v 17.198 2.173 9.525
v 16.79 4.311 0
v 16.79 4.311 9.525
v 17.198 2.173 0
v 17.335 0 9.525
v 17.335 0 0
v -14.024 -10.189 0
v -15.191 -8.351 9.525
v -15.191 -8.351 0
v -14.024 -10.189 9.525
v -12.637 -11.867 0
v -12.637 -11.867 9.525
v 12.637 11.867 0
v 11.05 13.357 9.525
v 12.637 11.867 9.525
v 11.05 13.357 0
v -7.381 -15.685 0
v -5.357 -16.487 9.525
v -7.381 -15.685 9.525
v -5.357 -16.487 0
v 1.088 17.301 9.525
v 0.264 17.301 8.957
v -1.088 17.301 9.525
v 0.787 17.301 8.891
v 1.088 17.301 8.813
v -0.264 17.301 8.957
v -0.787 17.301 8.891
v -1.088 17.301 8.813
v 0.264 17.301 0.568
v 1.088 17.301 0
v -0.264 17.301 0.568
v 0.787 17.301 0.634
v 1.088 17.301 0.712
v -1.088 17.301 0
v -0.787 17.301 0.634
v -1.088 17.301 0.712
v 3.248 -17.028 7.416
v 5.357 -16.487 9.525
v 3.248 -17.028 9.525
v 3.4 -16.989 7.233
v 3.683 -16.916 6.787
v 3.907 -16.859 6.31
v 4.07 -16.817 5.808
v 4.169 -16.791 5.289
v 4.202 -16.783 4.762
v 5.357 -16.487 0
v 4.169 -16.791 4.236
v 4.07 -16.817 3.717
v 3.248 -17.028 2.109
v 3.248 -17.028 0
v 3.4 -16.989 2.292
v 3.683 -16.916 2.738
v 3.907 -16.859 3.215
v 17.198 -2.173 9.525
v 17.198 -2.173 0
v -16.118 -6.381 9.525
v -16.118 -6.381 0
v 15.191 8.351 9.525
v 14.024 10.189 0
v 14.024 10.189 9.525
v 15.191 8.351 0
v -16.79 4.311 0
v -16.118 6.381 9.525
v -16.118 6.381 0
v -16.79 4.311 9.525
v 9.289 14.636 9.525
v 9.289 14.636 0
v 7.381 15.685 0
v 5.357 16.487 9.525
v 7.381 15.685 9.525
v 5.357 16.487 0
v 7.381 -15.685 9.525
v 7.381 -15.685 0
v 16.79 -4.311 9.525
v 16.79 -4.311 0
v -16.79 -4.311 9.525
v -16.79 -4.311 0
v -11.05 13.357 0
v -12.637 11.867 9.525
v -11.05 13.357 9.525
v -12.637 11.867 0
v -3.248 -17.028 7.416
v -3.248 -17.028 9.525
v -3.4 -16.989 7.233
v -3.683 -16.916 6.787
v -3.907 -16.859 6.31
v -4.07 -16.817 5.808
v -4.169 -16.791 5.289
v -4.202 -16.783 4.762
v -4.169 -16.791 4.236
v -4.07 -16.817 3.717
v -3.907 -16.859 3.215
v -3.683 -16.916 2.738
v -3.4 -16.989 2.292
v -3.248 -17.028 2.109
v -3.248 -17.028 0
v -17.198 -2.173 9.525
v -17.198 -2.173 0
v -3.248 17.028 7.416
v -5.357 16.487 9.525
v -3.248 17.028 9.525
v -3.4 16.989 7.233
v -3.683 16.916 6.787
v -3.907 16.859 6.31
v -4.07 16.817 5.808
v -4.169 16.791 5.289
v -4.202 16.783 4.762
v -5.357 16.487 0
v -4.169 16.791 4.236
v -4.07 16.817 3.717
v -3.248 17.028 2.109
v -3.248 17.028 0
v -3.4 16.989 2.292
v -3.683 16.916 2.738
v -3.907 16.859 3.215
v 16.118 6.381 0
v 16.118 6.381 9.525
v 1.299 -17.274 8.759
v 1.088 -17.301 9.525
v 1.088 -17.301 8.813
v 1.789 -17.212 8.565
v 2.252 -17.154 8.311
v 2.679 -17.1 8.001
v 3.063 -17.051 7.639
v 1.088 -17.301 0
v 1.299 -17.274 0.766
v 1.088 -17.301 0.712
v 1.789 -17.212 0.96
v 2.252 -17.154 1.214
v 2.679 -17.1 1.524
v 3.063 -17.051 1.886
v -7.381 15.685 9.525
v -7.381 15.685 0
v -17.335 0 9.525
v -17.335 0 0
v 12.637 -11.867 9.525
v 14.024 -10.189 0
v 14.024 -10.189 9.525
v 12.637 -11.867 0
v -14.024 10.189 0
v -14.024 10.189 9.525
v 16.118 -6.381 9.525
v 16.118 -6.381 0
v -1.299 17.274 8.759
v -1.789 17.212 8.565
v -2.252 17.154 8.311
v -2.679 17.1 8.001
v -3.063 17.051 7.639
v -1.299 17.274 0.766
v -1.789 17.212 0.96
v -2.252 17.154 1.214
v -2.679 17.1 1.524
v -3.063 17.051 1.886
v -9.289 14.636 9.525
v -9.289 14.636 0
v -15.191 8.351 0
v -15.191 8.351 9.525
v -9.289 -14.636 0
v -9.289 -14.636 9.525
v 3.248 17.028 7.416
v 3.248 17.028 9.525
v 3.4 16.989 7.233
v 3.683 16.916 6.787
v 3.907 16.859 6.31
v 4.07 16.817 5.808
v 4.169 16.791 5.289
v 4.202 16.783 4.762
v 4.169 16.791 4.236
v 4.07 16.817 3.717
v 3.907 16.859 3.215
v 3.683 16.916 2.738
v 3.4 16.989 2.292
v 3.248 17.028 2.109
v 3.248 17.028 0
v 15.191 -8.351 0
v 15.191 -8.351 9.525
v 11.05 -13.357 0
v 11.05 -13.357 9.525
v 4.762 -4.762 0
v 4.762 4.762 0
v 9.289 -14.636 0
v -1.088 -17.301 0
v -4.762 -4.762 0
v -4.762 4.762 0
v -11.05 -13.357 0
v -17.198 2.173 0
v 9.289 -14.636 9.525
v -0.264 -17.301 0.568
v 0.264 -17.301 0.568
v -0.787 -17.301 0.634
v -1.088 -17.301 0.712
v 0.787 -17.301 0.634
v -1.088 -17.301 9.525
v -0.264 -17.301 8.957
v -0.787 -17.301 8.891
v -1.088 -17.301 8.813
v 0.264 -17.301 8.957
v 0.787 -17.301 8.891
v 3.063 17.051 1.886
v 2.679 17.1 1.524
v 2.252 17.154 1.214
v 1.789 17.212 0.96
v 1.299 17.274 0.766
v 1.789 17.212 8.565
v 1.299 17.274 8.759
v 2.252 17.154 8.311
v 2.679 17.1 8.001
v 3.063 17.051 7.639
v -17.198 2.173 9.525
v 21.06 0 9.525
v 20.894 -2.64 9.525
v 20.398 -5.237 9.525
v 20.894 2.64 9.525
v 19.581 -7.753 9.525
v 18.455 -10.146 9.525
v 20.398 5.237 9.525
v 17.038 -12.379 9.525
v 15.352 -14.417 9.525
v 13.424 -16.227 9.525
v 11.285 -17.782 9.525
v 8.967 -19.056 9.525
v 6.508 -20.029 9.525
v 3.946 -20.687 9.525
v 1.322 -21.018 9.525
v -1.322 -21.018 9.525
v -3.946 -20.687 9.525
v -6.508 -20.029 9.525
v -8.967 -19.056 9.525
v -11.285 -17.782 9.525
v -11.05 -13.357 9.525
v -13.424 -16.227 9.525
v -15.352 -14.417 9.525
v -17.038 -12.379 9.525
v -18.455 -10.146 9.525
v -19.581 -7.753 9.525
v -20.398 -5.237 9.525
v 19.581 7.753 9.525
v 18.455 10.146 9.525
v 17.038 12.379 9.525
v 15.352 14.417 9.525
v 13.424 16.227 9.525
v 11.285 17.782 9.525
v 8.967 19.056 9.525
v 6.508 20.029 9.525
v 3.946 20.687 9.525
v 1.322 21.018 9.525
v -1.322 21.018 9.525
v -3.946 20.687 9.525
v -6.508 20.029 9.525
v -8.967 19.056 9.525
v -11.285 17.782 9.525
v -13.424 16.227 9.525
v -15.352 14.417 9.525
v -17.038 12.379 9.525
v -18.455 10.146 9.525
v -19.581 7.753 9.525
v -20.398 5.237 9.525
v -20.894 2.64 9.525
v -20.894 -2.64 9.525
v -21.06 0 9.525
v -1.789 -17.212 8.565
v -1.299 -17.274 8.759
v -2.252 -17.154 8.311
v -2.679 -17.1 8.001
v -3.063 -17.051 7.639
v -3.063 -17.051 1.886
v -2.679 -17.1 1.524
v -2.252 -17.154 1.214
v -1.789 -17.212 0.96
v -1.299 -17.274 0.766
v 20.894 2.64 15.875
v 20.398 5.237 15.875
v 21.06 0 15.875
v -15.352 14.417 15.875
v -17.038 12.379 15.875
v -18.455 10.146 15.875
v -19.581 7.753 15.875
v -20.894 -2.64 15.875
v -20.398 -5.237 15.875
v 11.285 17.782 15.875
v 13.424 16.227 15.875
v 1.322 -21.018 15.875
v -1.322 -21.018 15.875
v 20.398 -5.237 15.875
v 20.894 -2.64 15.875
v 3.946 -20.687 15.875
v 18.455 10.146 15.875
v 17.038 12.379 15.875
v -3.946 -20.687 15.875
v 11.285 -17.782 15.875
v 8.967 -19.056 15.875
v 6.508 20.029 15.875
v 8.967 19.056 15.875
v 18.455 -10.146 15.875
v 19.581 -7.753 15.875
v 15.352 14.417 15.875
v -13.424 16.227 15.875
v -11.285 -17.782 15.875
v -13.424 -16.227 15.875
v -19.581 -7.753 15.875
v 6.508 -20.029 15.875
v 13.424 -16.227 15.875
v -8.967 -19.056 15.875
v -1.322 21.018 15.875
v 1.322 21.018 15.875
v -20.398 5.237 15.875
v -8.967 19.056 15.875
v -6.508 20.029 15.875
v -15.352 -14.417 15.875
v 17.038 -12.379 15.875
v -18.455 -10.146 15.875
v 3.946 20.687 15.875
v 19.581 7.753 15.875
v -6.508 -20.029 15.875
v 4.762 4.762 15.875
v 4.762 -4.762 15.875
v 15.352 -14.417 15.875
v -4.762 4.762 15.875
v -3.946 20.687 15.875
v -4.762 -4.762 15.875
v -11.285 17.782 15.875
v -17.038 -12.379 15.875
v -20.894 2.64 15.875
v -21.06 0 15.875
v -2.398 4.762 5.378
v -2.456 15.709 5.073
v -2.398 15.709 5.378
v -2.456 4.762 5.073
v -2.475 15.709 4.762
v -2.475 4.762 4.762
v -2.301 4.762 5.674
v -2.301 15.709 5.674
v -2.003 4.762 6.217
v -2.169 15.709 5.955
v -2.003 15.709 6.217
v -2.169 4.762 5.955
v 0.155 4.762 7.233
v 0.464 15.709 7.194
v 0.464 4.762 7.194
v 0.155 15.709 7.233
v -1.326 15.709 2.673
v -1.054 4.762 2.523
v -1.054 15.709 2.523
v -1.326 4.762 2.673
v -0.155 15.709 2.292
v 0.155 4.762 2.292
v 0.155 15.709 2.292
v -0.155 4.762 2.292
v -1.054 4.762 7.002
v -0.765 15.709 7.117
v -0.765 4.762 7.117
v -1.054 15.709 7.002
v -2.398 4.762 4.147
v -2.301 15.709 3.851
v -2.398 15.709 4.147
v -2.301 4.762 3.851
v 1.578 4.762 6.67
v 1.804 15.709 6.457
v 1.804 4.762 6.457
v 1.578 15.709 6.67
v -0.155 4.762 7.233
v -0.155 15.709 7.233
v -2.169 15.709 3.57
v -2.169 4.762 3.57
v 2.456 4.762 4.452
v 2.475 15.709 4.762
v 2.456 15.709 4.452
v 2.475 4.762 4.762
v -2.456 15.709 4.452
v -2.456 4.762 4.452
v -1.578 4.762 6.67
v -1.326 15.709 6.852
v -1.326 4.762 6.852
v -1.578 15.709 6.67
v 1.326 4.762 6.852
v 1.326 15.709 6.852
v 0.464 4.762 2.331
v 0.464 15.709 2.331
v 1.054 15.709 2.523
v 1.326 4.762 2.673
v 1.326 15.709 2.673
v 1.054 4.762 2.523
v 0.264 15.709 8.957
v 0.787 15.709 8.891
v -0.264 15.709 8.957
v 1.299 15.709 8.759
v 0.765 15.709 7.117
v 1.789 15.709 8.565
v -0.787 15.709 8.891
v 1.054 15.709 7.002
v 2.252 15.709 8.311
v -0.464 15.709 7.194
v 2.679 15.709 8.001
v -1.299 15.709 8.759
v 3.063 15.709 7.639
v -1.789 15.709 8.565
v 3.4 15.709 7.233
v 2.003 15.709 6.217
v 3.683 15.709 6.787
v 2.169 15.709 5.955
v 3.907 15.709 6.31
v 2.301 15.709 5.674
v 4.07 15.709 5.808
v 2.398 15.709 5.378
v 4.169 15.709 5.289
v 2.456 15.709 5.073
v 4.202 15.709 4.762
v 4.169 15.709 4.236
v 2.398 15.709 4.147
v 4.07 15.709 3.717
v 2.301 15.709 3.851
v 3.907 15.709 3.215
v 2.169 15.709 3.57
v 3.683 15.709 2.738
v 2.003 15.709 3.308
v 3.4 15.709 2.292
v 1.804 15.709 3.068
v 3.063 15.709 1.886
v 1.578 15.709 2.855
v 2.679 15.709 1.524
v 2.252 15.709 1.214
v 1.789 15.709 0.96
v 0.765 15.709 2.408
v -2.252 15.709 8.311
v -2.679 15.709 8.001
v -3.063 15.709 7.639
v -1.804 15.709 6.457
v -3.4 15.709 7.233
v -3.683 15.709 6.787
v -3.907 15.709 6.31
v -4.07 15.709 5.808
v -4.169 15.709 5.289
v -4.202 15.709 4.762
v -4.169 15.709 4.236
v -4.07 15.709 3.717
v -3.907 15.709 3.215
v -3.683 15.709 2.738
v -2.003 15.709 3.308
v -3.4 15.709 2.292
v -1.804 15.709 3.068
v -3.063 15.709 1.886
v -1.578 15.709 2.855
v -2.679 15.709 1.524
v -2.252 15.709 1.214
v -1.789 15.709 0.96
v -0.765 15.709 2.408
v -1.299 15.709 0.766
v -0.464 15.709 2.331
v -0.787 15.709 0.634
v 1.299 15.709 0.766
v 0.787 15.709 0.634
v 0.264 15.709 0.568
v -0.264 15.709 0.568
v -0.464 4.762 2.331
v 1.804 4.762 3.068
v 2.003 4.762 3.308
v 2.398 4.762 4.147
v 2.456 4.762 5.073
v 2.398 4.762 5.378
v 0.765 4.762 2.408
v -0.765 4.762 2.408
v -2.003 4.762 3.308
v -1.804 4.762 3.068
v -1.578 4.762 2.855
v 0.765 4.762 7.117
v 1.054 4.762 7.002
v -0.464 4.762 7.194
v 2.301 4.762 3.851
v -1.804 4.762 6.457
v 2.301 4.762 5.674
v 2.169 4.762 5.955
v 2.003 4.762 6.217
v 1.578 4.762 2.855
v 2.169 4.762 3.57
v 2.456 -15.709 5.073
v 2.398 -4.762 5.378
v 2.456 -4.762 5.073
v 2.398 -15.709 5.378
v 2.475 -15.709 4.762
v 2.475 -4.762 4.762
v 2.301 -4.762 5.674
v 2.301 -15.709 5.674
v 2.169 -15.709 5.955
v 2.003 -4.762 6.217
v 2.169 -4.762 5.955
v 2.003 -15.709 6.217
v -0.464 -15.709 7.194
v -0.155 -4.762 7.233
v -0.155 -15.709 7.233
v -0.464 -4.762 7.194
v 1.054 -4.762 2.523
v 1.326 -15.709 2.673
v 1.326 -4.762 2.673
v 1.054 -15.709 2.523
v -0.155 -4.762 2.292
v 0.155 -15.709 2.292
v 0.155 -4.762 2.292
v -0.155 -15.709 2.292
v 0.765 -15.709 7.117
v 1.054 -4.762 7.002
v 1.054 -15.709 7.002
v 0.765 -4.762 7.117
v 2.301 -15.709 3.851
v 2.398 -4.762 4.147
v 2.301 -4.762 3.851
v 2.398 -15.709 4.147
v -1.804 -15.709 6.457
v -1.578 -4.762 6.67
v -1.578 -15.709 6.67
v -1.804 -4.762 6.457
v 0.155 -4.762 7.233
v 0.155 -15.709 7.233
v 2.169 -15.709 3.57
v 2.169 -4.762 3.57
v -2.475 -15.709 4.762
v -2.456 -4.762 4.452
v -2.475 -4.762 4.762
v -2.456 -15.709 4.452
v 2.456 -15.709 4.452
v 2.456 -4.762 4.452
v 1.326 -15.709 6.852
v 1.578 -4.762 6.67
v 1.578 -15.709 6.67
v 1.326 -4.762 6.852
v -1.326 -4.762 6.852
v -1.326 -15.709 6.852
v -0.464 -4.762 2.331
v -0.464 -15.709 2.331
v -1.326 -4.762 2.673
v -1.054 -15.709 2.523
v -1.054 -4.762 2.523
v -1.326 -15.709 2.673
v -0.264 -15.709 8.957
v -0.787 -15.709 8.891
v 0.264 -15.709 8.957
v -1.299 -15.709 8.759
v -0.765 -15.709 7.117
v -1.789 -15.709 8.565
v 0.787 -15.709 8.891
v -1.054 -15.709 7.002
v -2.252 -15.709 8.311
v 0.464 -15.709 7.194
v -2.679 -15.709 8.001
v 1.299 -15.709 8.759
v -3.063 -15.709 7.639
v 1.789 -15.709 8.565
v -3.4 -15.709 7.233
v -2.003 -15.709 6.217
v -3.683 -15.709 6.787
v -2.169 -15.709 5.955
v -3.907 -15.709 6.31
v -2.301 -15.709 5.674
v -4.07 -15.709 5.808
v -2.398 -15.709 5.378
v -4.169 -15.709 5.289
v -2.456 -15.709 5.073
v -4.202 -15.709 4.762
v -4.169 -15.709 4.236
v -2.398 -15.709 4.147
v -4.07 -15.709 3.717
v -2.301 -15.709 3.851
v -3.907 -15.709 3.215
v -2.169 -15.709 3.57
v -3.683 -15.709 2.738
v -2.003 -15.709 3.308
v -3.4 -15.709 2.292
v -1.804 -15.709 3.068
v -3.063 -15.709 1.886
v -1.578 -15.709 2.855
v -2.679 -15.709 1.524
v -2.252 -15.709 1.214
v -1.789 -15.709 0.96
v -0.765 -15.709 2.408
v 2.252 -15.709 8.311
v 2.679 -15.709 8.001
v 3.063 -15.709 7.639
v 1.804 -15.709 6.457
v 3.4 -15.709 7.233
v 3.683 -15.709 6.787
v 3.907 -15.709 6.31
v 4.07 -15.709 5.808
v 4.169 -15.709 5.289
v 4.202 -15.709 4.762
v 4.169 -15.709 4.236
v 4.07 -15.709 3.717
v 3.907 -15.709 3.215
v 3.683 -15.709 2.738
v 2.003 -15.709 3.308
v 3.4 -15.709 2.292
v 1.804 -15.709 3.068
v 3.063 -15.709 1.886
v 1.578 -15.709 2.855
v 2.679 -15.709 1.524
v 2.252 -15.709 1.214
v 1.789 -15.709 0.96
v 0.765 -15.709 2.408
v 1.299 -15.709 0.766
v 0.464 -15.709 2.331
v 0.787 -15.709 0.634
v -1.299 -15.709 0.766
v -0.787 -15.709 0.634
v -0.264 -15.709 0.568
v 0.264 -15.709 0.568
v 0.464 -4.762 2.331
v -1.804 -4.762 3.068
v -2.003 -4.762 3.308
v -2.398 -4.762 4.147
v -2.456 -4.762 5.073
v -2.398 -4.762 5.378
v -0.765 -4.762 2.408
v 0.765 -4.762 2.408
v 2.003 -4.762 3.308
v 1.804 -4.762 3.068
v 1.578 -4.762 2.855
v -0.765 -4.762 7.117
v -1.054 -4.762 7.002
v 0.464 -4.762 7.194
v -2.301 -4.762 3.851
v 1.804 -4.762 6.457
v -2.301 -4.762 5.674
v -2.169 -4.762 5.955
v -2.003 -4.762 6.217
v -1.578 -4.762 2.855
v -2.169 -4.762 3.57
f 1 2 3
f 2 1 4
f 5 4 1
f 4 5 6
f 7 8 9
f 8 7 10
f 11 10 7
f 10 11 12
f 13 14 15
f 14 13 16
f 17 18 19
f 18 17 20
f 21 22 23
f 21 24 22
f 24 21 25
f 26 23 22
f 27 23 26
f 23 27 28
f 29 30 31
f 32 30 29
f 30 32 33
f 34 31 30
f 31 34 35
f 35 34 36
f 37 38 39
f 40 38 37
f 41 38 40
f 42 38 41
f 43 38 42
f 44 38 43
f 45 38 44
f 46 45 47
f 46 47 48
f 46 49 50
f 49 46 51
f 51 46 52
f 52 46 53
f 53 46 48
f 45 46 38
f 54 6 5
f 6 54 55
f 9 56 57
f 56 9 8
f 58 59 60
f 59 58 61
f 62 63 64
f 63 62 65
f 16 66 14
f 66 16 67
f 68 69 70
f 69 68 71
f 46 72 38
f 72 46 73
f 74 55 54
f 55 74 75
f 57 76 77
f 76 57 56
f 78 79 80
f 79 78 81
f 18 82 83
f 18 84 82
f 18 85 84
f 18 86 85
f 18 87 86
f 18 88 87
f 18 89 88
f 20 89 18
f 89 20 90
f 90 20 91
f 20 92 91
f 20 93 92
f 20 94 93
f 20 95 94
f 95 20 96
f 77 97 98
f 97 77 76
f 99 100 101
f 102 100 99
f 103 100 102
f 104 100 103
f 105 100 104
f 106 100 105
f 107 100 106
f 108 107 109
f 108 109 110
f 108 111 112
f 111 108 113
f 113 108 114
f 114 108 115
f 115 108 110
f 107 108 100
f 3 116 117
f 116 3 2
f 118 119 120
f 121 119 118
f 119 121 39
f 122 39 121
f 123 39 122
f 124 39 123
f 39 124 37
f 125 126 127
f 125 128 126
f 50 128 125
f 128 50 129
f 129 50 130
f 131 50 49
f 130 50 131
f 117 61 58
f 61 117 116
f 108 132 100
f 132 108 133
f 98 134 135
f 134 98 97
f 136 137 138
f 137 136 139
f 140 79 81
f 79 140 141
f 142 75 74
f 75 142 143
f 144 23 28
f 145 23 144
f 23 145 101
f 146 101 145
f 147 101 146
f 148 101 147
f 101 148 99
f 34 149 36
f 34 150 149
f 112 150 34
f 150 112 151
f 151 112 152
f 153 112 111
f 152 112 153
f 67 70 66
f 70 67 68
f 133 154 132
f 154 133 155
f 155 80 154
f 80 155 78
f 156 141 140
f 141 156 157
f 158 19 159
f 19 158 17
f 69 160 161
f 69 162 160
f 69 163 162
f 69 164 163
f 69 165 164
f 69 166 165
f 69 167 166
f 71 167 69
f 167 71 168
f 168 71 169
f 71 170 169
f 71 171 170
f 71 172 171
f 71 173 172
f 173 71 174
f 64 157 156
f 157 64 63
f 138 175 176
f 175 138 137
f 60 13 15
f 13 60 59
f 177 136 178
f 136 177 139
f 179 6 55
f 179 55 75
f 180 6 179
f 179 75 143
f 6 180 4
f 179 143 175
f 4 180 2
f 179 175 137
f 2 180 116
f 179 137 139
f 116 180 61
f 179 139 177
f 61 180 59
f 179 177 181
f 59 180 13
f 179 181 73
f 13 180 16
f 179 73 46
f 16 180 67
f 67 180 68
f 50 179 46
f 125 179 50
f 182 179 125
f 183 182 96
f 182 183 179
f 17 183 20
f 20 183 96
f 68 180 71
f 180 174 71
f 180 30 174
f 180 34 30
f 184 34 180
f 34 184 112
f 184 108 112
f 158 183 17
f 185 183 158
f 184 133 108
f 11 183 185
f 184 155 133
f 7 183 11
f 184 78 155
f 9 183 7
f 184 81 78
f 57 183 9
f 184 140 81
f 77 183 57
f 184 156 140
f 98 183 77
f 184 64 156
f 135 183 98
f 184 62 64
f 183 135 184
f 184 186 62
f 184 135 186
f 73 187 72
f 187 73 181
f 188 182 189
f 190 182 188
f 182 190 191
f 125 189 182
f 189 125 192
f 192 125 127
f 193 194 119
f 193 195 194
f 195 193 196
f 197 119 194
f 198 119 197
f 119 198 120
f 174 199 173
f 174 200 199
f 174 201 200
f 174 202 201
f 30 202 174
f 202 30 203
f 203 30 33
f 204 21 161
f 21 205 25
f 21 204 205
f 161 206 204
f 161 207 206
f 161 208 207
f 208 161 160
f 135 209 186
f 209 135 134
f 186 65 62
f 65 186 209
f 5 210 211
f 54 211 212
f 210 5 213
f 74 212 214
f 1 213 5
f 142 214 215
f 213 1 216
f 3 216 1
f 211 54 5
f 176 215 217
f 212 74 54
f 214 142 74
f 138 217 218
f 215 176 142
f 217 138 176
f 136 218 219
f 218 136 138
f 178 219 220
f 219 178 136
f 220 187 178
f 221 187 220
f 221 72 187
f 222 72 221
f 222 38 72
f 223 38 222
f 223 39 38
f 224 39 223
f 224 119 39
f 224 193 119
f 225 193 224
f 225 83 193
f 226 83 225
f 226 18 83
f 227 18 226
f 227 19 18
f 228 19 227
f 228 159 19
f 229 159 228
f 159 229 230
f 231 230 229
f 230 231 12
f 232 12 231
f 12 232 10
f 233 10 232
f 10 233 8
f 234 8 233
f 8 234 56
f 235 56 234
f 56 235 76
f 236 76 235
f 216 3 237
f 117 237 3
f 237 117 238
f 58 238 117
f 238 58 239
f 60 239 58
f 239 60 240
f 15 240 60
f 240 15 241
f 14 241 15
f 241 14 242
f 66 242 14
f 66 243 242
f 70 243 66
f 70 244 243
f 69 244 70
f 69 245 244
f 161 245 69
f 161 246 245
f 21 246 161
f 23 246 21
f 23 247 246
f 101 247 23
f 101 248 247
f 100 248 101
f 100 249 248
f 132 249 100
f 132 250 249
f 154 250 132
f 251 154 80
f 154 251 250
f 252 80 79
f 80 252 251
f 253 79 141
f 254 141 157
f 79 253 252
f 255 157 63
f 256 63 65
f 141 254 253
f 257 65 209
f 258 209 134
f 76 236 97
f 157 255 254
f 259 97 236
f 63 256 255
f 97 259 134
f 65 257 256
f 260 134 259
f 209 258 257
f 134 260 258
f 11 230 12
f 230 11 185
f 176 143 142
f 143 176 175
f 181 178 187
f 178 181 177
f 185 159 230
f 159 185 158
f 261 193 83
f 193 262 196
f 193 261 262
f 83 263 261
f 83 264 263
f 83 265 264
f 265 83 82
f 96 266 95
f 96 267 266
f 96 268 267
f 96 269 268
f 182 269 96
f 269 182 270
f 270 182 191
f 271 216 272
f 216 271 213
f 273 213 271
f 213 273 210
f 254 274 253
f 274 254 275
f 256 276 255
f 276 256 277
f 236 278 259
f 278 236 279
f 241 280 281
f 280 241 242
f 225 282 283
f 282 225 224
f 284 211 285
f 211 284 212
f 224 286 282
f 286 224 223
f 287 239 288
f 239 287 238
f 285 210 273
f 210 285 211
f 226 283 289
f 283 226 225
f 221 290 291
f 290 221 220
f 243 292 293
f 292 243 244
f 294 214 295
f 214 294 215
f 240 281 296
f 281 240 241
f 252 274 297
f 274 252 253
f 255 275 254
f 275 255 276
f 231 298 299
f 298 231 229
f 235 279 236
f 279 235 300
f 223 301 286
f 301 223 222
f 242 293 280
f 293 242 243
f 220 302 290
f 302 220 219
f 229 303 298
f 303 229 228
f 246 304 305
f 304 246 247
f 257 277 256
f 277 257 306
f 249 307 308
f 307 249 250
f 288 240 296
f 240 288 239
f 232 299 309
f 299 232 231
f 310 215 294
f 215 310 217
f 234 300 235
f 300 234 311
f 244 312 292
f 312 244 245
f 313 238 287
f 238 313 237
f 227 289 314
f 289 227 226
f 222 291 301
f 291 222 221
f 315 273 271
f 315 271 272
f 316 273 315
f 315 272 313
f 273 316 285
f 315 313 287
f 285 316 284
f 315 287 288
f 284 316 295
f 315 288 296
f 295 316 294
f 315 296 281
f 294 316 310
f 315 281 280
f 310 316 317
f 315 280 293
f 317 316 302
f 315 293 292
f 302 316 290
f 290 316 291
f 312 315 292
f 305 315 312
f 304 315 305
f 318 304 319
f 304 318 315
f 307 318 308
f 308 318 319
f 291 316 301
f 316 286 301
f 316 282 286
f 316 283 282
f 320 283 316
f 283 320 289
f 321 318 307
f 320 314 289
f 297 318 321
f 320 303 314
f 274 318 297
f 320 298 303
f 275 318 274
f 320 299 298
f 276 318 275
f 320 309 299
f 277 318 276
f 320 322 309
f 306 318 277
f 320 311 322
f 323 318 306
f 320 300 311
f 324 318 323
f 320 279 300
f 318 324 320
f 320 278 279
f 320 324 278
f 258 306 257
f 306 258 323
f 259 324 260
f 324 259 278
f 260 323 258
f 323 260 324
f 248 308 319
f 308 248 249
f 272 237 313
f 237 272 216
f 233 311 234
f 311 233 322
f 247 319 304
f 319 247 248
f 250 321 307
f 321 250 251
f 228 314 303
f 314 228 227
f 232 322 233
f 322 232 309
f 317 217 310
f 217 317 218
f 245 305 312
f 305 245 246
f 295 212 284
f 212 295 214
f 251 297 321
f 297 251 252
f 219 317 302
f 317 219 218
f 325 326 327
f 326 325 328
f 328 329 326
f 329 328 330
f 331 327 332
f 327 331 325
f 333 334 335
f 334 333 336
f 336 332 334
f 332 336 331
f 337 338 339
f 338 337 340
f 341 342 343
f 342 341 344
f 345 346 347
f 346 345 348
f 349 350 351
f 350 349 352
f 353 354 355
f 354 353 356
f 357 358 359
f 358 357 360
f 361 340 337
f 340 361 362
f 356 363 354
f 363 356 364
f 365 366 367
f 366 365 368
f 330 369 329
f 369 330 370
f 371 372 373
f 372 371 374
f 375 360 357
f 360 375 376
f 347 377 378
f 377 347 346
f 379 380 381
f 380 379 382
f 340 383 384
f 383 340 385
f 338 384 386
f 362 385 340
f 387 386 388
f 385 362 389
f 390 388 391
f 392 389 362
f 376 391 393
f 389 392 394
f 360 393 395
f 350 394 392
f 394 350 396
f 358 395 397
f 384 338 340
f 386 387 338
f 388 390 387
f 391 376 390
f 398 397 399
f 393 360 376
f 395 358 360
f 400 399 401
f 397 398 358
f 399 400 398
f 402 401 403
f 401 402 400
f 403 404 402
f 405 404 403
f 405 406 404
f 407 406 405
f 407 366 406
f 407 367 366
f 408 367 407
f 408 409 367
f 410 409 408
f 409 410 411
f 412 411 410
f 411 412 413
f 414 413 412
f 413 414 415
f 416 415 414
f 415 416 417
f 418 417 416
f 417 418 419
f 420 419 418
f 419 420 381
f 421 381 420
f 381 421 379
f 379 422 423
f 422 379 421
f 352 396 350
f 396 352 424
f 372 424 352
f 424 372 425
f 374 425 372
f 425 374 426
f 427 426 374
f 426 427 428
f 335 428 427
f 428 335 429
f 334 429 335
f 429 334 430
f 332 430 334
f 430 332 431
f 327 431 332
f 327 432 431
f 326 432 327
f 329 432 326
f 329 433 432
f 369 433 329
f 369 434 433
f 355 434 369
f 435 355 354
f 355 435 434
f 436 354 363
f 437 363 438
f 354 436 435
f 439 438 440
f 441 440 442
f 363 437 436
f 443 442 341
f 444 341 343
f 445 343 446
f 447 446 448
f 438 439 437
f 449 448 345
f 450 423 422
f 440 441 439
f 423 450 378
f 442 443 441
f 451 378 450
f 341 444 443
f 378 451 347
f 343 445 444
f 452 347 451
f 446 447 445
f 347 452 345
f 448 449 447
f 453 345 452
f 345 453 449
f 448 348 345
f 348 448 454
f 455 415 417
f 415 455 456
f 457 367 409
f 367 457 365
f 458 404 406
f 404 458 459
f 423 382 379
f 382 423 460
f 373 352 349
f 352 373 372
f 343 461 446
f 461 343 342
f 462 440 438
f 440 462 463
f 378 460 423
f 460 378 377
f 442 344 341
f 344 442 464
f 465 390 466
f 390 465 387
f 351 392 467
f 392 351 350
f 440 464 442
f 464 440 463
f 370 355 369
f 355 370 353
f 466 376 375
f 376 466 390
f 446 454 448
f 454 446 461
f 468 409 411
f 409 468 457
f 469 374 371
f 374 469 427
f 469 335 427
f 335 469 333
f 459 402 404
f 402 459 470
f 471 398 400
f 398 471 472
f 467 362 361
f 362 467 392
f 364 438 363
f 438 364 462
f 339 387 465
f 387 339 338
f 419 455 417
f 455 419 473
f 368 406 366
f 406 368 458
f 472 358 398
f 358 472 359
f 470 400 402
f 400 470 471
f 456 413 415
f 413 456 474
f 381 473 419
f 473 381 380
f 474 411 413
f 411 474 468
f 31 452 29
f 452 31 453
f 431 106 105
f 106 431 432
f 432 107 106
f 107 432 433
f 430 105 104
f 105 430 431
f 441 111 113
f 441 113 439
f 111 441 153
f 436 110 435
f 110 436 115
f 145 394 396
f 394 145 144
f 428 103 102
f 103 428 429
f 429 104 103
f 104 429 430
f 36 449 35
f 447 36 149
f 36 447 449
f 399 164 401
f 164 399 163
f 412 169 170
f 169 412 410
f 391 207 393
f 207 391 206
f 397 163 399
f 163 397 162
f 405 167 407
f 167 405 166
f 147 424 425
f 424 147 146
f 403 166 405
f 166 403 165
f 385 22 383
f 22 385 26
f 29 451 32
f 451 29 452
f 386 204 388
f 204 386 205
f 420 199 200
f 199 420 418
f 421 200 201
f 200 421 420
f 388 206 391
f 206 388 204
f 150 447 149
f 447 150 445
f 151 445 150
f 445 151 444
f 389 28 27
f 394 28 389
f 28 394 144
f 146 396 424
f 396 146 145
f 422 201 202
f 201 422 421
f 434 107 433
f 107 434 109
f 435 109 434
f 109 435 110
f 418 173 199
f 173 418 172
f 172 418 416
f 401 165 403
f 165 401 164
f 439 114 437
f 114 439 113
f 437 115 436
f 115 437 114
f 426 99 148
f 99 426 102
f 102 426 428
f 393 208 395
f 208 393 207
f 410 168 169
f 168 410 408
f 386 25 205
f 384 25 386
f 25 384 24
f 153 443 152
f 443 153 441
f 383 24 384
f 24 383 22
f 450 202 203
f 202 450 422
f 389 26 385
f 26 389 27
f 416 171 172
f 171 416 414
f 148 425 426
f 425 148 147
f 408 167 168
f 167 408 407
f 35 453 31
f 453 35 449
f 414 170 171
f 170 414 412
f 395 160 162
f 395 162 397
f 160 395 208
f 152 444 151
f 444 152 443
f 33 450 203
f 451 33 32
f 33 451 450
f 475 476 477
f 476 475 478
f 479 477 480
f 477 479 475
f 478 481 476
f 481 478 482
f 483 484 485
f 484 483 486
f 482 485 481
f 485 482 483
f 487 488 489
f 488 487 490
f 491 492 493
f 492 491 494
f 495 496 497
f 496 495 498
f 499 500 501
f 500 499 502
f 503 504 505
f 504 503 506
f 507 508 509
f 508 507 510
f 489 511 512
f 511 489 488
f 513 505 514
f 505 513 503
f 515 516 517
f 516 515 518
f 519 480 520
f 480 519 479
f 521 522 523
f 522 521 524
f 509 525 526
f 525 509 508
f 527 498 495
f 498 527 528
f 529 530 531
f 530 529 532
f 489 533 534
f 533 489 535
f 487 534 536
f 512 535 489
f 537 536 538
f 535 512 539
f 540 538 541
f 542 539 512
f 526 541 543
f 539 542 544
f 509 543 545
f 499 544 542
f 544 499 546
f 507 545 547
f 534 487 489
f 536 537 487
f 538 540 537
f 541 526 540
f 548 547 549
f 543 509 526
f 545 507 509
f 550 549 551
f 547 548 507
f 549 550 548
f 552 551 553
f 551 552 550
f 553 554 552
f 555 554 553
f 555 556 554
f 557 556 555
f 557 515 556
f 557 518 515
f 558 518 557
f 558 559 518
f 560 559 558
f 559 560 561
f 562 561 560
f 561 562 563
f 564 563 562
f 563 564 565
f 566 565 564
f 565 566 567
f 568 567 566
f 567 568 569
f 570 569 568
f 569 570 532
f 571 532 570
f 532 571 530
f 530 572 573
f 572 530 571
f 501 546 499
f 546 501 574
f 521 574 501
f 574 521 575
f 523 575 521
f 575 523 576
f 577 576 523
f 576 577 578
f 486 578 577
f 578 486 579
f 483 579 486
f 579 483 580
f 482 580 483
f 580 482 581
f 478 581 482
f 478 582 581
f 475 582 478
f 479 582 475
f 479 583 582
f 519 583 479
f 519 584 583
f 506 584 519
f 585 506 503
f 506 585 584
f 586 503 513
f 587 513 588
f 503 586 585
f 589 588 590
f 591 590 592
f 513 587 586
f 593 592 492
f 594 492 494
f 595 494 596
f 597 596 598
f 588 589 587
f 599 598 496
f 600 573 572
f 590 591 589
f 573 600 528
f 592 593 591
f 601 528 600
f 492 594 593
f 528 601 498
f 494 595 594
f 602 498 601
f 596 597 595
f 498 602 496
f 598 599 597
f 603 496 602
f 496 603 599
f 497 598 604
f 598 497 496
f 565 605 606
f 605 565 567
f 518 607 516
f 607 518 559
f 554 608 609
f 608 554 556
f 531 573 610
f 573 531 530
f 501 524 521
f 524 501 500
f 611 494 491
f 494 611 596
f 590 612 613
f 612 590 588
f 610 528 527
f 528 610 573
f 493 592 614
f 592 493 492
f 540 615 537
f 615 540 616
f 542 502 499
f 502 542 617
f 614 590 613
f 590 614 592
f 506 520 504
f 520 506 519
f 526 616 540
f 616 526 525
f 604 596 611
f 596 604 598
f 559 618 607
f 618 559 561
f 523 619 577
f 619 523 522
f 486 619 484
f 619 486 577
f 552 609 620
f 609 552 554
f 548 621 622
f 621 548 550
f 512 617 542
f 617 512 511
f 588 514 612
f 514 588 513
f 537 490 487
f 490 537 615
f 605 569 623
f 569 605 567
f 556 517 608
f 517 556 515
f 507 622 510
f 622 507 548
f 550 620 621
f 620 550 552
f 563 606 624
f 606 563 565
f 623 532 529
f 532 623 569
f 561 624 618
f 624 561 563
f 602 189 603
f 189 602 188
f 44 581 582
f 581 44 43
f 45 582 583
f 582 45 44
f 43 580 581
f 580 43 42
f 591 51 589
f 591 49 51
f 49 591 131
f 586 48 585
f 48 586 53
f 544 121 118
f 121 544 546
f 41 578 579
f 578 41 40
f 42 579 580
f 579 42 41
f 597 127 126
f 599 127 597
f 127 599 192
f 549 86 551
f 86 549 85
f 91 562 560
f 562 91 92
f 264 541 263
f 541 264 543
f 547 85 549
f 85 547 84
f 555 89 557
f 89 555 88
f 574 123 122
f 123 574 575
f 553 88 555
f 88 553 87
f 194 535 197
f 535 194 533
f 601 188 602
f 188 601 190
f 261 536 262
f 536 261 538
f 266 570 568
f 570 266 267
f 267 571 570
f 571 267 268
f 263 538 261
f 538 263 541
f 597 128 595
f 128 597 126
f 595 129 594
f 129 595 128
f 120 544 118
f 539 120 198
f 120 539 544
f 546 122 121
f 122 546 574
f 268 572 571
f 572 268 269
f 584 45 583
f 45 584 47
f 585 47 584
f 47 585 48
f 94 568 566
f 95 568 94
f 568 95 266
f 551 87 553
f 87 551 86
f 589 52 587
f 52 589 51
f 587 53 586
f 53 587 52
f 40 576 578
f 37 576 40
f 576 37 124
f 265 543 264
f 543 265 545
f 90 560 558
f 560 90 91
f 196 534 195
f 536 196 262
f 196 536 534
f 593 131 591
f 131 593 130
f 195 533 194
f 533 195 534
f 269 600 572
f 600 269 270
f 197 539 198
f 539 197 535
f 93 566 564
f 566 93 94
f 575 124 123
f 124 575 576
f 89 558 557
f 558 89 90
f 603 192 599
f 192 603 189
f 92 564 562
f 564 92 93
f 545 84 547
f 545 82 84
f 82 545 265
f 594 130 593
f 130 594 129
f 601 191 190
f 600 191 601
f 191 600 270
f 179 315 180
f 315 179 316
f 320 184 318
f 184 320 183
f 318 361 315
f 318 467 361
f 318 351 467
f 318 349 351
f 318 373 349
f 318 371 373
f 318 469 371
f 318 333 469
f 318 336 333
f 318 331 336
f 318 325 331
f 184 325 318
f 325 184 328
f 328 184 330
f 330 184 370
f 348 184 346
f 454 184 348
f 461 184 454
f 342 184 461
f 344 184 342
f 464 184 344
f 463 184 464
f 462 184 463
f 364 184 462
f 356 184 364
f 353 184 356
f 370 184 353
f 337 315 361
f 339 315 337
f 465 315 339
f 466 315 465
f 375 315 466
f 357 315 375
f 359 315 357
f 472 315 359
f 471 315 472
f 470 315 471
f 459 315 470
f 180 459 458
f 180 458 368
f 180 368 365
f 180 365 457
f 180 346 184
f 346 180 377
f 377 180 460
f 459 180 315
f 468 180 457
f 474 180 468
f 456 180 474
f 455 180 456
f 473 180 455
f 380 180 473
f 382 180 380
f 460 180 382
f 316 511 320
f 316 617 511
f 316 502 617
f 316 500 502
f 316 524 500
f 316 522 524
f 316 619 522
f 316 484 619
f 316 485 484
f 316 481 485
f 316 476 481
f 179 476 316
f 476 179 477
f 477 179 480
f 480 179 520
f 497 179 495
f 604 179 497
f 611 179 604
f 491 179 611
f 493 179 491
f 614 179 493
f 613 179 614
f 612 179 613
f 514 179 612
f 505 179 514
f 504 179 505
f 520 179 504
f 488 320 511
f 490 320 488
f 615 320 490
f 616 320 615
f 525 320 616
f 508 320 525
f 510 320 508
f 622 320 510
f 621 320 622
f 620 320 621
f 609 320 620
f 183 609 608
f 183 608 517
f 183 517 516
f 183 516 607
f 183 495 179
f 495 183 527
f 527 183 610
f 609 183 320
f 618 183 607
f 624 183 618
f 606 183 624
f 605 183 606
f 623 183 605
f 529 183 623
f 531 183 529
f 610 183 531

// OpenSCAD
// file: parts.scad
plungerTubeOD = 42.12;
plungerTubeWallThickness = 3.8;
plungerTubeID = plungerTubeOD - 2*plungerTubeWallThickness;

rivetLength = fromInches(0.438);
// this is fudged to be x2 so that it sits deeper inside a
// curved surface
rivetFlangeThickness = fromInches(0.032)*2;

function fromInches (i) = i * 25.4;
function pressFitGap (d) = d + 0.15;

/*
McMaster-Carr part #93482A605
Aluminum Rivet Nut, 6-32 Internal Thread, .010"-.075"
Material Thickness
*/

module rivetRing (radius, n) {
	for (i = [1:n]) {
		rotate([0,0,360/n*i])
		translate([0,rivetLength+rivetFlangeThickness-radius,0])
		rotate([90,0,0])
		rivetNut();
	}
}

module rivetNut () {
	diameter = fromInches(0.189); // #12 drill hole
	flangeDiameter = fromInches(0.325);

	union () {
		cylinder (d=pressFitGap(diameter), h=rivetLength);
		translate ([0,0,rivetLength])
			cylinder(
				d=pressFitGap(flangeDiameter),
				h = rivetFlangeThickness);
	}
}
// main file
use <parts.scad>

$fn = 50;

plungerTubeOD = 42.12;
plungerTubeWallThickness = 3.8;
plungerTubeID = plungerTubeOD - 2*plungerTubeWallThickness;

diameter = pressFitGap(plungerTubeID);

plungerRodWidth = fromInches(3/8);

insertedLength = fromInches(3/8);
capWidth = fromInches(1/4);

difference () {
	union () {
		// Inserted body
		cylinder (
			d = diameter,
			h = insertedLength);
		// Outer cap
		translate ([0,0,insertedLength])
			cylinder (d = plungerTubeOD, h = capWidth);
	}
	// Plunger rod hole
	translate ([plungerRodWidth/-2,plungerRodWidth/-2,0])
		cube ([
			plungerRodWidth,
			plungerRodWidth,
			insertedLength+capWidth]);
	// rivets
	translate([0,0,insertedLength/2])
	#rivetRing(diameter/2,2);
}
